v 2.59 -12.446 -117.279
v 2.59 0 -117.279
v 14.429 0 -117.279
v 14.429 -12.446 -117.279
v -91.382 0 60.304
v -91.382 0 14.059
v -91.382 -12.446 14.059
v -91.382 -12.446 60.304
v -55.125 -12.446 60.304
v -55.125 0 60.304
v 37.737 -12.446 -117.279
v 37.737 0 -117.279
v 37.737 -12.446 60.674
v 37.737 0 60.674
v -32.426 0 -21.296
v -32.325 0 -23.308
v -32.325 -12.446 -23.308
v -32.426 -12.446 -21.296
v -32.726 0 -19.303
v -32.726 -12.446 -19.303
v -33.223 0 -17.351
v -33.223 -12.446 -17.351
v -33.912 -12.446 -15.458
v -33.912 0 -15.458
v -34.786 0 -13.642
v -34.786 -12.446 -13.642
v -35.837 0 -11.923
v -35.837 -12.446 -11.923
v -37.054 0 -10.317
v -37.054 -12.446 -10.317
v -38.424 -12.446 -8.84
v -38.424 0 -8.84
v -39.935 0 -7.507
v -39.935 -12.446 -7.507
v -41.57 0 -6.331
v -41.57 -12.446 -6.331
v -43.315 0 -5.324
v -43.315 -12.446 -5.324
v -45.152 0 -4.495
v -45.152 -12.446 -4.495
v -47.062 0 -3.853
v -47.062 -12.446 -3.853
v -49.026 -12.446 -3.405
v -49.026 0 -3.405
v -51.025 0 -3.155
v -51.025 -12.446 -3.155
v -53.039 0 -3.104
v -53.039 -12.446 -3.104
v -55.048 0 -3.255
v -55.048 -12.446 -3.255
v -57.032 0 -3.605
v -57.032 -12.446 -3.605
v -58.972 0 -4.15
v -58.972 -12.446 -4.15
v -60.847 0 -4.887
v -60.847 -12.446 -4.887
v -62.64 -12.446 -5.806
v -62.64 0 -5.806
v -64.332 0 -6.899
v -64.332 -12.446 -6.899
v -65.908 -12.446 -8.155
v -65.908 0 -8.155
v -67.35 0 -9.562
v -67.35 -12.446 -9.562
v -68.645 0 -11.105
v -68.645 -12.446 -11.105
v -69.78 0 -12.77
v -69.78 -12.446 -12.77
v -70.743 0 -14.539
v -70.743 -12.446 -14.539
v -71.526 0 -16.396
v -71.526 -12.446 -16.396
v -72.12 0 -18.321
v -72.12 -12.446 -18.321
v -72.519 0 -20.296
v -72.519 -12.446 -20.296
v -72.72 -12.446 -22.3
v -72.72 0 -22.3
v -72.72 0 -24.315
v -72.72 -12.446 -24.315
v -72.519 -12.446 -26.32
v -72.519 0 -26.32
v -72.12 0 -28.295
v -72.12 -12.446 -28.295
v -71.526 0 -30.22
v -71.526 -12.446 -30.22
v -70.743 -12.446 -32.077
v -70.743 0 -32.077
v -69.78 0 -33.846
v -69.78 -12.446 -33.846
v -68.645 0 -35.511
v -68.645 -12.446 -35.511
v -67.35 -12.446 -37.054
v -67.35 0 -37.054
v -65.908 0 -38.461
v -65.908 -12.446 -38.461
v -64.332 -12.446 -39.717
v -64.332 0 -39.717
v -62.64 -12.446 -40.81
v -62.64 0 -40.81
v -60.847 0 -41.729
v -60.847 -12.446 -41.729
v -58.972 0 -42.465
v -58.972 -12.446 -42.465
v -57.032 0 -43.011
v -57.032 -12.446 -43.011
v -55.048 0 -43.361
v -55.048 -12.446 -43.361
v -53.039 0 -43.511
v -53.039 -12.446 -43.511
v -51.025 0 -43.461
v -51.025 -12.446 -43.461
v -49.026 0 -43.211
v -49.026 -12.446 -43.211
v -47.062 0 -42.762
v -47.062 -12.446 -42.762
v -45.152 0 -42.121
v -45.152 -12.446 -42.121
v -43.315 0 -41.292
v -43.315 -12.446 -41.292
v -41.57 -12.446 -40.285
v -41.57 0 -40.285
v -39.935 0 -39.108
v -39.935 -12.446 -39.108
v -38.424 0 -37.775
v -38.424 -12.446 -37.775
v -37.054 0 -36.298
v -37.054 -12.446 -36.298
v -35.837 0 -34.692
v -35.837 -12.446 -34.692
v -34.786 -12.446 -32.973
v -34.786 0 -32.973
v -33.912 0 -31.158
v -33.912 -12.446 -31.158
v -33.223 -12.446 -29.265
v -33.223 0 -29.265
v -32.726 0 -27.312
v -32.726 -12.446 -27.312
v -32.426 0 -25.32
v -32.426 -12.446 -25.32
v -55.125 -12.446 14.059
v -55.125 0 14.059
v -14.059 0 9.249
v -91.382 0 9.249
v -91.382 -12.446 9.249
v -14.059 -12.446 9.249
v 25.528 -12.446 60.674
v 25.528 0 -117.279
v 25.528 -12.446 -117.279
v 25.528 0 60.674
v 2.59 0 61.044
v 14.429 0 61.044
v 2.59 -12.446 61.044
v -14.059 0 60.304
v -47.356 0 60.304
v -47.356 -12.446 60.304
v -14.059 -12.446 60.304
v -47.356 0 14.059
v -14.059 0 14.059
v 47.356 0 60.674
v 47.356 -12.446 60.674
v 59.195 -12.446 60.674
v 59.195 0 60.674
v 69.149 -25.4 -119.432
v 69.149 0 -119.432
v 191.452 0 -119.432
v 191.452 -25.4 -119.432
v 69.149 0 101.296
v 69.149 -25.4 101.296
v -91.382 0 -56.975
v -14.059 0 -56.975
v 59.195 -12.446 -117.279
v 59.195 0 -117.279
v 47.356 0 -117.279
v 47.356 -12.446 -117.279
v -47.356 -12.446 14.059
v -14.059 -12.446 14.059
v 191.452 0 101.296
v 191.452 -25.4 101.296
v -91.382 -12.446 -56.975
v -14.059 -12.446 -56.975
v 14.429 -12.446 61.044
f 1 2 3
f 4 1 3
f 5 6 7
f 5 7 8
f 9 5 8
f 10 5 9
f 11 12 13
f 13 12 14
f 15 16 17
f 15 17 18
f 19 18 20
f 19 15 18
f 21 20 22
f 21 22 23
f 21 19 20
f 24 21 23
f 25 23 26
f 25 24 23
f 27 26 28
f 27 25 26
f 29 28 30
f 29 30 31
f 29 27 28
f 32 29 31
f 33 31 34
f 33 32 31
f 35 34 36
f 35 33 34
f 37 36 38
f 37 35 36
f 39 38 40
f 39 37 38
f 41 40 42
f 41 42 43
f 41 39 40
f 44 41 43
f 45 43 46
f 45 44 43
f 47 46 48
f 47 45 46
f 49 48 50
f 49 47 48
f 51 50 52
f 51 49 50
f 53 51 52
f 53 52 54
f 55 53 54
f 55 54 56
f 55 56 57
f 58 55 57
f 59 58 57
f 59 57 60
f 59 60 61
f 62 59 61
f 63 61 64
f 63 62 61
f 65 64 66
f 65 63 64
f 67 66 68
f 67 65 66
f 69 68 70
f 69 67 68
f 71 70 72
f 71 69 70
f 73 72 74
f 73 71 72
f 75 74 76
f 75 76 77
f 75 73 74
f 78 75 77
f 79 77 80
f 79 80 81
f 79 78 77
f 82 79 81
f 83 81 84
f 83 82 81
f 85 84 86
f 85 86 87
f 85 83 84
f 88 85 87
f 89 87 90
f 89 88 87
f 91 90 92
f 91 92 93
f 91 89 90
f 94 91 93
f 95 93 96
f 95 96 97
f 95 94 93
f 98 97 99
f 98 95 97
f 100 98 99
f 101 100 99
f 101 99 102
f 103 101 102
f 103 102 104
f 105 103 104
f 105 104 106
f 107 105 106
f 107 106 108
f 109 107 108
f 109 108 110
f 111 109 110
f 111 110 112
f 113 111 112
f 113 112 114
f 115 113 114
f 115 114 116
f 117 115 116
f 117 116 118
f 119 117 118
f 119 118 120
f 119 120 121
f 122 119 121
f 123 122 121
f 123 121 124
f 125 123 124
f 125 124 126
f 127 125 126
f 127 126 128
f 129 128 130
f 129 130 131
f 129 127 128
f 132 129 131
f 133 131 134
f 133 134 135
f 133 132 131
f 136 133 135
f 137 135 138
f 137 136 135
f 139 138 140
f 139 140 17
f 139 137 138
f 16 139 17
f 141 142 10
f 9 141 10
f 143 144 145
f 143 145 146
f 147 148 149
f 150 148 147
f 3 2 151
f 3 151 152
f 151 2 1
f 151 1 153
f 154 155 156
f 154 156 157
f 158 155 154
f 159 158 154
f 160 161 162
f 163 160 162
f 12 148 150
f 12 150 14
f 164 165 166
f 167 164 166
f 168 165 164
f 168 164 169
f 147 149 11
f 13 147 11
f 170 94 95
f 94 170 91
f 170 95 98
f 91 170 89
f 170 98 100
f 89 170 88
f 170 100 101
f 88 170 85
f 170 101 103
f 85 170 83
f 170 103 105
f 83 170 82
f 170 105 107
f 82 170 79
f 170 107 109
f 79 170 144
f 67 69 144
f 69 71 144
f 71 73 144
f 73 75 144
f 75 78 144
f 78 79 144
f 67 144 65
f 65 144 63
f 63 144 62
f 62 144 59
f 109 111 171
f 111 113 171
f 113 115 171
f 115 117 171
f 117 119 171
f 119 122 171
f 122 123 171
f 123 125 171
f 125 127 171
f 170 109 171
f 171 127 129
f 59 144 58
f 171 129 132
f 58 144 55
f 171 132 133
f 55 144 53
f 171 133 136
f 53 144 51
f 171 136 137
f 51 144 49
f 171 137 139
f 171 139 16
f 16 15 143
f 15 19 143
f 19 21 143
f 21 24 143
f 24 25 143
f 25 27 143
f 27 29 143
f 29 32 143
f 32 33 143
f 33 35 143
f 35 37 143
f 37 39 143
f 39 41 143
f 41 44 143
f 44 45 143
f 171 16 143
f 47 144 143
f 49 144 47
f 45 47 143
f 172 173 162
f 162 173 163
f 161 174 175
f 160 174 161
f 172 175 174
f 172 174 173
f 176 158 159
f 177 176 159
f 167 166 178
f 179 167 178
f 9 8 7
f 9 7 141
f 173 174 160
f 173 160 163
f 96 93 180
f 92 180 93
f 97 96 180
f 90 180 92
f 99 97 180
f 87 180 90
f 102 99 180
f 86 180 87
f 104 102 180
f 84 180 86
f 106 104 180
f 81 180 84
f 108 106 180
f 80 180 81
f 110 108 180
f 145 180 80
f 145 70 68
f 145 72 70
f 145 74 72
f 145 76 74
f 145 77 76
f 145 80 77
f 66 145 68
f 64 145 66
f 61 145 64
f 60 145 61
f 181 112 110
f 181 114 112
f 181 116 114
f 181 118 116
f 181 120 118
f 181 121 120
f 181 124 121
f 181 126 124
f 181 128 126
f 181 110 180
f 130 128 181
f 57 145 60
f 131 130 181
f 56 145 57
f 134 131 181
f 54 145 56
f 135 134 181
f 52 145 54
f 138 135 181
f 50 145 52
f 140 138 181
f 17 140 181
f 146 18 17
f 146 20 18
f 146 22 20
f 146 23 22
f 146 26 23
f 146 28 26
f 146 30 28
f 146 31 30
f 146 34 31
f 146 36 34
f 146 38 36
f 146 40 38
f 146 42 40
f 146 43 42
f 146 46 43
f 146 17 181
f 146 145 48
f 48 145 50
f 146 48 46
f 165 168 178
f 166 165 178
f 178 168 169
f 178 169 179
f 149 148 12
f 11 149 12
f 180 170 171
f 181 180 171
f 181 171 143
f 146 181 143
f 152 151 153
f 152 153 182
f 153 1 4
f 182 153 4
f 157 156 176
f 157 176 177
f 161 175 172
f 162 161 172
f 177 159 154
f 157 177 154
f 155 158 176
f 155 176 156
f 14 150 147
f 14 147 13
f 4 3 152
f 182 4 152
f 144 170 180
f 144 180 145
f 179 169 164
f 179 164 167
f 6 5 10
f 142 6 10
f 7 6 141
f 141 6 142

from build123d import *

# Parameters (mm, degrees)
F0_W     = 36.256648
F0_H     = 46.245723
F0_W_2   = 33.296924
F0_W_3   = 11.838905
F0_H_2   = 178.323515
F0_W_4   = 12.208875
F0_H_3   = 177.953549
F0_W_5   = 11.838906
F0_W_6   = 77.322851
F0_H_4   = 66.223875
F0_R     = 20.209753
F1_DEPTH = 12.446
F0_W_7   = 122.303232
F0_H_5   = 220.728188
F2_DEPTH = 25.4


with BuildPart() as f1:
    # F0 (on Front) → F1 (new body)
    with BuildSketch(Plane.XZ):
        with Locations((-73.253218, 37.181565)):
            Rectangle(F0_W, F0_H)
        with Locations((-30.707153, 37.181565)):
            Rectangle(F0_W_2, F0_H)
        with Locations((8.509221, -28.1174)):
            Rectangle(F0_W_3, F0_H_2)
        with Locations((31.632082, -28.302383)):
            Rectangle(F0_W_4, F0_H_3)
        with Locations((53.275086, -28.302383)):
            Rectangle(F0_W_5, F0_H_3)
        with Locations((-52.720116, -23.86279)):
            Rectangle(F0_W_6, F0_H_4)
        with Locations((-52.535135, -23.307843)):
            Circle(F0_R, mode=Mode.SUBTRACT)
    extrude(amount=F1_DEPTH)


with BuildPart() as f2:
    # F0 (on Front) → F2 (new body)
    with BuildSketch(Plane.XZ):
        with Locations((130.300738, -9.068355)):
            Rectangle(F0_W_7, F0_H_5)
    extrude(amount=F2_DEPTH)


solid = Compound([f1.part, f2.part])
